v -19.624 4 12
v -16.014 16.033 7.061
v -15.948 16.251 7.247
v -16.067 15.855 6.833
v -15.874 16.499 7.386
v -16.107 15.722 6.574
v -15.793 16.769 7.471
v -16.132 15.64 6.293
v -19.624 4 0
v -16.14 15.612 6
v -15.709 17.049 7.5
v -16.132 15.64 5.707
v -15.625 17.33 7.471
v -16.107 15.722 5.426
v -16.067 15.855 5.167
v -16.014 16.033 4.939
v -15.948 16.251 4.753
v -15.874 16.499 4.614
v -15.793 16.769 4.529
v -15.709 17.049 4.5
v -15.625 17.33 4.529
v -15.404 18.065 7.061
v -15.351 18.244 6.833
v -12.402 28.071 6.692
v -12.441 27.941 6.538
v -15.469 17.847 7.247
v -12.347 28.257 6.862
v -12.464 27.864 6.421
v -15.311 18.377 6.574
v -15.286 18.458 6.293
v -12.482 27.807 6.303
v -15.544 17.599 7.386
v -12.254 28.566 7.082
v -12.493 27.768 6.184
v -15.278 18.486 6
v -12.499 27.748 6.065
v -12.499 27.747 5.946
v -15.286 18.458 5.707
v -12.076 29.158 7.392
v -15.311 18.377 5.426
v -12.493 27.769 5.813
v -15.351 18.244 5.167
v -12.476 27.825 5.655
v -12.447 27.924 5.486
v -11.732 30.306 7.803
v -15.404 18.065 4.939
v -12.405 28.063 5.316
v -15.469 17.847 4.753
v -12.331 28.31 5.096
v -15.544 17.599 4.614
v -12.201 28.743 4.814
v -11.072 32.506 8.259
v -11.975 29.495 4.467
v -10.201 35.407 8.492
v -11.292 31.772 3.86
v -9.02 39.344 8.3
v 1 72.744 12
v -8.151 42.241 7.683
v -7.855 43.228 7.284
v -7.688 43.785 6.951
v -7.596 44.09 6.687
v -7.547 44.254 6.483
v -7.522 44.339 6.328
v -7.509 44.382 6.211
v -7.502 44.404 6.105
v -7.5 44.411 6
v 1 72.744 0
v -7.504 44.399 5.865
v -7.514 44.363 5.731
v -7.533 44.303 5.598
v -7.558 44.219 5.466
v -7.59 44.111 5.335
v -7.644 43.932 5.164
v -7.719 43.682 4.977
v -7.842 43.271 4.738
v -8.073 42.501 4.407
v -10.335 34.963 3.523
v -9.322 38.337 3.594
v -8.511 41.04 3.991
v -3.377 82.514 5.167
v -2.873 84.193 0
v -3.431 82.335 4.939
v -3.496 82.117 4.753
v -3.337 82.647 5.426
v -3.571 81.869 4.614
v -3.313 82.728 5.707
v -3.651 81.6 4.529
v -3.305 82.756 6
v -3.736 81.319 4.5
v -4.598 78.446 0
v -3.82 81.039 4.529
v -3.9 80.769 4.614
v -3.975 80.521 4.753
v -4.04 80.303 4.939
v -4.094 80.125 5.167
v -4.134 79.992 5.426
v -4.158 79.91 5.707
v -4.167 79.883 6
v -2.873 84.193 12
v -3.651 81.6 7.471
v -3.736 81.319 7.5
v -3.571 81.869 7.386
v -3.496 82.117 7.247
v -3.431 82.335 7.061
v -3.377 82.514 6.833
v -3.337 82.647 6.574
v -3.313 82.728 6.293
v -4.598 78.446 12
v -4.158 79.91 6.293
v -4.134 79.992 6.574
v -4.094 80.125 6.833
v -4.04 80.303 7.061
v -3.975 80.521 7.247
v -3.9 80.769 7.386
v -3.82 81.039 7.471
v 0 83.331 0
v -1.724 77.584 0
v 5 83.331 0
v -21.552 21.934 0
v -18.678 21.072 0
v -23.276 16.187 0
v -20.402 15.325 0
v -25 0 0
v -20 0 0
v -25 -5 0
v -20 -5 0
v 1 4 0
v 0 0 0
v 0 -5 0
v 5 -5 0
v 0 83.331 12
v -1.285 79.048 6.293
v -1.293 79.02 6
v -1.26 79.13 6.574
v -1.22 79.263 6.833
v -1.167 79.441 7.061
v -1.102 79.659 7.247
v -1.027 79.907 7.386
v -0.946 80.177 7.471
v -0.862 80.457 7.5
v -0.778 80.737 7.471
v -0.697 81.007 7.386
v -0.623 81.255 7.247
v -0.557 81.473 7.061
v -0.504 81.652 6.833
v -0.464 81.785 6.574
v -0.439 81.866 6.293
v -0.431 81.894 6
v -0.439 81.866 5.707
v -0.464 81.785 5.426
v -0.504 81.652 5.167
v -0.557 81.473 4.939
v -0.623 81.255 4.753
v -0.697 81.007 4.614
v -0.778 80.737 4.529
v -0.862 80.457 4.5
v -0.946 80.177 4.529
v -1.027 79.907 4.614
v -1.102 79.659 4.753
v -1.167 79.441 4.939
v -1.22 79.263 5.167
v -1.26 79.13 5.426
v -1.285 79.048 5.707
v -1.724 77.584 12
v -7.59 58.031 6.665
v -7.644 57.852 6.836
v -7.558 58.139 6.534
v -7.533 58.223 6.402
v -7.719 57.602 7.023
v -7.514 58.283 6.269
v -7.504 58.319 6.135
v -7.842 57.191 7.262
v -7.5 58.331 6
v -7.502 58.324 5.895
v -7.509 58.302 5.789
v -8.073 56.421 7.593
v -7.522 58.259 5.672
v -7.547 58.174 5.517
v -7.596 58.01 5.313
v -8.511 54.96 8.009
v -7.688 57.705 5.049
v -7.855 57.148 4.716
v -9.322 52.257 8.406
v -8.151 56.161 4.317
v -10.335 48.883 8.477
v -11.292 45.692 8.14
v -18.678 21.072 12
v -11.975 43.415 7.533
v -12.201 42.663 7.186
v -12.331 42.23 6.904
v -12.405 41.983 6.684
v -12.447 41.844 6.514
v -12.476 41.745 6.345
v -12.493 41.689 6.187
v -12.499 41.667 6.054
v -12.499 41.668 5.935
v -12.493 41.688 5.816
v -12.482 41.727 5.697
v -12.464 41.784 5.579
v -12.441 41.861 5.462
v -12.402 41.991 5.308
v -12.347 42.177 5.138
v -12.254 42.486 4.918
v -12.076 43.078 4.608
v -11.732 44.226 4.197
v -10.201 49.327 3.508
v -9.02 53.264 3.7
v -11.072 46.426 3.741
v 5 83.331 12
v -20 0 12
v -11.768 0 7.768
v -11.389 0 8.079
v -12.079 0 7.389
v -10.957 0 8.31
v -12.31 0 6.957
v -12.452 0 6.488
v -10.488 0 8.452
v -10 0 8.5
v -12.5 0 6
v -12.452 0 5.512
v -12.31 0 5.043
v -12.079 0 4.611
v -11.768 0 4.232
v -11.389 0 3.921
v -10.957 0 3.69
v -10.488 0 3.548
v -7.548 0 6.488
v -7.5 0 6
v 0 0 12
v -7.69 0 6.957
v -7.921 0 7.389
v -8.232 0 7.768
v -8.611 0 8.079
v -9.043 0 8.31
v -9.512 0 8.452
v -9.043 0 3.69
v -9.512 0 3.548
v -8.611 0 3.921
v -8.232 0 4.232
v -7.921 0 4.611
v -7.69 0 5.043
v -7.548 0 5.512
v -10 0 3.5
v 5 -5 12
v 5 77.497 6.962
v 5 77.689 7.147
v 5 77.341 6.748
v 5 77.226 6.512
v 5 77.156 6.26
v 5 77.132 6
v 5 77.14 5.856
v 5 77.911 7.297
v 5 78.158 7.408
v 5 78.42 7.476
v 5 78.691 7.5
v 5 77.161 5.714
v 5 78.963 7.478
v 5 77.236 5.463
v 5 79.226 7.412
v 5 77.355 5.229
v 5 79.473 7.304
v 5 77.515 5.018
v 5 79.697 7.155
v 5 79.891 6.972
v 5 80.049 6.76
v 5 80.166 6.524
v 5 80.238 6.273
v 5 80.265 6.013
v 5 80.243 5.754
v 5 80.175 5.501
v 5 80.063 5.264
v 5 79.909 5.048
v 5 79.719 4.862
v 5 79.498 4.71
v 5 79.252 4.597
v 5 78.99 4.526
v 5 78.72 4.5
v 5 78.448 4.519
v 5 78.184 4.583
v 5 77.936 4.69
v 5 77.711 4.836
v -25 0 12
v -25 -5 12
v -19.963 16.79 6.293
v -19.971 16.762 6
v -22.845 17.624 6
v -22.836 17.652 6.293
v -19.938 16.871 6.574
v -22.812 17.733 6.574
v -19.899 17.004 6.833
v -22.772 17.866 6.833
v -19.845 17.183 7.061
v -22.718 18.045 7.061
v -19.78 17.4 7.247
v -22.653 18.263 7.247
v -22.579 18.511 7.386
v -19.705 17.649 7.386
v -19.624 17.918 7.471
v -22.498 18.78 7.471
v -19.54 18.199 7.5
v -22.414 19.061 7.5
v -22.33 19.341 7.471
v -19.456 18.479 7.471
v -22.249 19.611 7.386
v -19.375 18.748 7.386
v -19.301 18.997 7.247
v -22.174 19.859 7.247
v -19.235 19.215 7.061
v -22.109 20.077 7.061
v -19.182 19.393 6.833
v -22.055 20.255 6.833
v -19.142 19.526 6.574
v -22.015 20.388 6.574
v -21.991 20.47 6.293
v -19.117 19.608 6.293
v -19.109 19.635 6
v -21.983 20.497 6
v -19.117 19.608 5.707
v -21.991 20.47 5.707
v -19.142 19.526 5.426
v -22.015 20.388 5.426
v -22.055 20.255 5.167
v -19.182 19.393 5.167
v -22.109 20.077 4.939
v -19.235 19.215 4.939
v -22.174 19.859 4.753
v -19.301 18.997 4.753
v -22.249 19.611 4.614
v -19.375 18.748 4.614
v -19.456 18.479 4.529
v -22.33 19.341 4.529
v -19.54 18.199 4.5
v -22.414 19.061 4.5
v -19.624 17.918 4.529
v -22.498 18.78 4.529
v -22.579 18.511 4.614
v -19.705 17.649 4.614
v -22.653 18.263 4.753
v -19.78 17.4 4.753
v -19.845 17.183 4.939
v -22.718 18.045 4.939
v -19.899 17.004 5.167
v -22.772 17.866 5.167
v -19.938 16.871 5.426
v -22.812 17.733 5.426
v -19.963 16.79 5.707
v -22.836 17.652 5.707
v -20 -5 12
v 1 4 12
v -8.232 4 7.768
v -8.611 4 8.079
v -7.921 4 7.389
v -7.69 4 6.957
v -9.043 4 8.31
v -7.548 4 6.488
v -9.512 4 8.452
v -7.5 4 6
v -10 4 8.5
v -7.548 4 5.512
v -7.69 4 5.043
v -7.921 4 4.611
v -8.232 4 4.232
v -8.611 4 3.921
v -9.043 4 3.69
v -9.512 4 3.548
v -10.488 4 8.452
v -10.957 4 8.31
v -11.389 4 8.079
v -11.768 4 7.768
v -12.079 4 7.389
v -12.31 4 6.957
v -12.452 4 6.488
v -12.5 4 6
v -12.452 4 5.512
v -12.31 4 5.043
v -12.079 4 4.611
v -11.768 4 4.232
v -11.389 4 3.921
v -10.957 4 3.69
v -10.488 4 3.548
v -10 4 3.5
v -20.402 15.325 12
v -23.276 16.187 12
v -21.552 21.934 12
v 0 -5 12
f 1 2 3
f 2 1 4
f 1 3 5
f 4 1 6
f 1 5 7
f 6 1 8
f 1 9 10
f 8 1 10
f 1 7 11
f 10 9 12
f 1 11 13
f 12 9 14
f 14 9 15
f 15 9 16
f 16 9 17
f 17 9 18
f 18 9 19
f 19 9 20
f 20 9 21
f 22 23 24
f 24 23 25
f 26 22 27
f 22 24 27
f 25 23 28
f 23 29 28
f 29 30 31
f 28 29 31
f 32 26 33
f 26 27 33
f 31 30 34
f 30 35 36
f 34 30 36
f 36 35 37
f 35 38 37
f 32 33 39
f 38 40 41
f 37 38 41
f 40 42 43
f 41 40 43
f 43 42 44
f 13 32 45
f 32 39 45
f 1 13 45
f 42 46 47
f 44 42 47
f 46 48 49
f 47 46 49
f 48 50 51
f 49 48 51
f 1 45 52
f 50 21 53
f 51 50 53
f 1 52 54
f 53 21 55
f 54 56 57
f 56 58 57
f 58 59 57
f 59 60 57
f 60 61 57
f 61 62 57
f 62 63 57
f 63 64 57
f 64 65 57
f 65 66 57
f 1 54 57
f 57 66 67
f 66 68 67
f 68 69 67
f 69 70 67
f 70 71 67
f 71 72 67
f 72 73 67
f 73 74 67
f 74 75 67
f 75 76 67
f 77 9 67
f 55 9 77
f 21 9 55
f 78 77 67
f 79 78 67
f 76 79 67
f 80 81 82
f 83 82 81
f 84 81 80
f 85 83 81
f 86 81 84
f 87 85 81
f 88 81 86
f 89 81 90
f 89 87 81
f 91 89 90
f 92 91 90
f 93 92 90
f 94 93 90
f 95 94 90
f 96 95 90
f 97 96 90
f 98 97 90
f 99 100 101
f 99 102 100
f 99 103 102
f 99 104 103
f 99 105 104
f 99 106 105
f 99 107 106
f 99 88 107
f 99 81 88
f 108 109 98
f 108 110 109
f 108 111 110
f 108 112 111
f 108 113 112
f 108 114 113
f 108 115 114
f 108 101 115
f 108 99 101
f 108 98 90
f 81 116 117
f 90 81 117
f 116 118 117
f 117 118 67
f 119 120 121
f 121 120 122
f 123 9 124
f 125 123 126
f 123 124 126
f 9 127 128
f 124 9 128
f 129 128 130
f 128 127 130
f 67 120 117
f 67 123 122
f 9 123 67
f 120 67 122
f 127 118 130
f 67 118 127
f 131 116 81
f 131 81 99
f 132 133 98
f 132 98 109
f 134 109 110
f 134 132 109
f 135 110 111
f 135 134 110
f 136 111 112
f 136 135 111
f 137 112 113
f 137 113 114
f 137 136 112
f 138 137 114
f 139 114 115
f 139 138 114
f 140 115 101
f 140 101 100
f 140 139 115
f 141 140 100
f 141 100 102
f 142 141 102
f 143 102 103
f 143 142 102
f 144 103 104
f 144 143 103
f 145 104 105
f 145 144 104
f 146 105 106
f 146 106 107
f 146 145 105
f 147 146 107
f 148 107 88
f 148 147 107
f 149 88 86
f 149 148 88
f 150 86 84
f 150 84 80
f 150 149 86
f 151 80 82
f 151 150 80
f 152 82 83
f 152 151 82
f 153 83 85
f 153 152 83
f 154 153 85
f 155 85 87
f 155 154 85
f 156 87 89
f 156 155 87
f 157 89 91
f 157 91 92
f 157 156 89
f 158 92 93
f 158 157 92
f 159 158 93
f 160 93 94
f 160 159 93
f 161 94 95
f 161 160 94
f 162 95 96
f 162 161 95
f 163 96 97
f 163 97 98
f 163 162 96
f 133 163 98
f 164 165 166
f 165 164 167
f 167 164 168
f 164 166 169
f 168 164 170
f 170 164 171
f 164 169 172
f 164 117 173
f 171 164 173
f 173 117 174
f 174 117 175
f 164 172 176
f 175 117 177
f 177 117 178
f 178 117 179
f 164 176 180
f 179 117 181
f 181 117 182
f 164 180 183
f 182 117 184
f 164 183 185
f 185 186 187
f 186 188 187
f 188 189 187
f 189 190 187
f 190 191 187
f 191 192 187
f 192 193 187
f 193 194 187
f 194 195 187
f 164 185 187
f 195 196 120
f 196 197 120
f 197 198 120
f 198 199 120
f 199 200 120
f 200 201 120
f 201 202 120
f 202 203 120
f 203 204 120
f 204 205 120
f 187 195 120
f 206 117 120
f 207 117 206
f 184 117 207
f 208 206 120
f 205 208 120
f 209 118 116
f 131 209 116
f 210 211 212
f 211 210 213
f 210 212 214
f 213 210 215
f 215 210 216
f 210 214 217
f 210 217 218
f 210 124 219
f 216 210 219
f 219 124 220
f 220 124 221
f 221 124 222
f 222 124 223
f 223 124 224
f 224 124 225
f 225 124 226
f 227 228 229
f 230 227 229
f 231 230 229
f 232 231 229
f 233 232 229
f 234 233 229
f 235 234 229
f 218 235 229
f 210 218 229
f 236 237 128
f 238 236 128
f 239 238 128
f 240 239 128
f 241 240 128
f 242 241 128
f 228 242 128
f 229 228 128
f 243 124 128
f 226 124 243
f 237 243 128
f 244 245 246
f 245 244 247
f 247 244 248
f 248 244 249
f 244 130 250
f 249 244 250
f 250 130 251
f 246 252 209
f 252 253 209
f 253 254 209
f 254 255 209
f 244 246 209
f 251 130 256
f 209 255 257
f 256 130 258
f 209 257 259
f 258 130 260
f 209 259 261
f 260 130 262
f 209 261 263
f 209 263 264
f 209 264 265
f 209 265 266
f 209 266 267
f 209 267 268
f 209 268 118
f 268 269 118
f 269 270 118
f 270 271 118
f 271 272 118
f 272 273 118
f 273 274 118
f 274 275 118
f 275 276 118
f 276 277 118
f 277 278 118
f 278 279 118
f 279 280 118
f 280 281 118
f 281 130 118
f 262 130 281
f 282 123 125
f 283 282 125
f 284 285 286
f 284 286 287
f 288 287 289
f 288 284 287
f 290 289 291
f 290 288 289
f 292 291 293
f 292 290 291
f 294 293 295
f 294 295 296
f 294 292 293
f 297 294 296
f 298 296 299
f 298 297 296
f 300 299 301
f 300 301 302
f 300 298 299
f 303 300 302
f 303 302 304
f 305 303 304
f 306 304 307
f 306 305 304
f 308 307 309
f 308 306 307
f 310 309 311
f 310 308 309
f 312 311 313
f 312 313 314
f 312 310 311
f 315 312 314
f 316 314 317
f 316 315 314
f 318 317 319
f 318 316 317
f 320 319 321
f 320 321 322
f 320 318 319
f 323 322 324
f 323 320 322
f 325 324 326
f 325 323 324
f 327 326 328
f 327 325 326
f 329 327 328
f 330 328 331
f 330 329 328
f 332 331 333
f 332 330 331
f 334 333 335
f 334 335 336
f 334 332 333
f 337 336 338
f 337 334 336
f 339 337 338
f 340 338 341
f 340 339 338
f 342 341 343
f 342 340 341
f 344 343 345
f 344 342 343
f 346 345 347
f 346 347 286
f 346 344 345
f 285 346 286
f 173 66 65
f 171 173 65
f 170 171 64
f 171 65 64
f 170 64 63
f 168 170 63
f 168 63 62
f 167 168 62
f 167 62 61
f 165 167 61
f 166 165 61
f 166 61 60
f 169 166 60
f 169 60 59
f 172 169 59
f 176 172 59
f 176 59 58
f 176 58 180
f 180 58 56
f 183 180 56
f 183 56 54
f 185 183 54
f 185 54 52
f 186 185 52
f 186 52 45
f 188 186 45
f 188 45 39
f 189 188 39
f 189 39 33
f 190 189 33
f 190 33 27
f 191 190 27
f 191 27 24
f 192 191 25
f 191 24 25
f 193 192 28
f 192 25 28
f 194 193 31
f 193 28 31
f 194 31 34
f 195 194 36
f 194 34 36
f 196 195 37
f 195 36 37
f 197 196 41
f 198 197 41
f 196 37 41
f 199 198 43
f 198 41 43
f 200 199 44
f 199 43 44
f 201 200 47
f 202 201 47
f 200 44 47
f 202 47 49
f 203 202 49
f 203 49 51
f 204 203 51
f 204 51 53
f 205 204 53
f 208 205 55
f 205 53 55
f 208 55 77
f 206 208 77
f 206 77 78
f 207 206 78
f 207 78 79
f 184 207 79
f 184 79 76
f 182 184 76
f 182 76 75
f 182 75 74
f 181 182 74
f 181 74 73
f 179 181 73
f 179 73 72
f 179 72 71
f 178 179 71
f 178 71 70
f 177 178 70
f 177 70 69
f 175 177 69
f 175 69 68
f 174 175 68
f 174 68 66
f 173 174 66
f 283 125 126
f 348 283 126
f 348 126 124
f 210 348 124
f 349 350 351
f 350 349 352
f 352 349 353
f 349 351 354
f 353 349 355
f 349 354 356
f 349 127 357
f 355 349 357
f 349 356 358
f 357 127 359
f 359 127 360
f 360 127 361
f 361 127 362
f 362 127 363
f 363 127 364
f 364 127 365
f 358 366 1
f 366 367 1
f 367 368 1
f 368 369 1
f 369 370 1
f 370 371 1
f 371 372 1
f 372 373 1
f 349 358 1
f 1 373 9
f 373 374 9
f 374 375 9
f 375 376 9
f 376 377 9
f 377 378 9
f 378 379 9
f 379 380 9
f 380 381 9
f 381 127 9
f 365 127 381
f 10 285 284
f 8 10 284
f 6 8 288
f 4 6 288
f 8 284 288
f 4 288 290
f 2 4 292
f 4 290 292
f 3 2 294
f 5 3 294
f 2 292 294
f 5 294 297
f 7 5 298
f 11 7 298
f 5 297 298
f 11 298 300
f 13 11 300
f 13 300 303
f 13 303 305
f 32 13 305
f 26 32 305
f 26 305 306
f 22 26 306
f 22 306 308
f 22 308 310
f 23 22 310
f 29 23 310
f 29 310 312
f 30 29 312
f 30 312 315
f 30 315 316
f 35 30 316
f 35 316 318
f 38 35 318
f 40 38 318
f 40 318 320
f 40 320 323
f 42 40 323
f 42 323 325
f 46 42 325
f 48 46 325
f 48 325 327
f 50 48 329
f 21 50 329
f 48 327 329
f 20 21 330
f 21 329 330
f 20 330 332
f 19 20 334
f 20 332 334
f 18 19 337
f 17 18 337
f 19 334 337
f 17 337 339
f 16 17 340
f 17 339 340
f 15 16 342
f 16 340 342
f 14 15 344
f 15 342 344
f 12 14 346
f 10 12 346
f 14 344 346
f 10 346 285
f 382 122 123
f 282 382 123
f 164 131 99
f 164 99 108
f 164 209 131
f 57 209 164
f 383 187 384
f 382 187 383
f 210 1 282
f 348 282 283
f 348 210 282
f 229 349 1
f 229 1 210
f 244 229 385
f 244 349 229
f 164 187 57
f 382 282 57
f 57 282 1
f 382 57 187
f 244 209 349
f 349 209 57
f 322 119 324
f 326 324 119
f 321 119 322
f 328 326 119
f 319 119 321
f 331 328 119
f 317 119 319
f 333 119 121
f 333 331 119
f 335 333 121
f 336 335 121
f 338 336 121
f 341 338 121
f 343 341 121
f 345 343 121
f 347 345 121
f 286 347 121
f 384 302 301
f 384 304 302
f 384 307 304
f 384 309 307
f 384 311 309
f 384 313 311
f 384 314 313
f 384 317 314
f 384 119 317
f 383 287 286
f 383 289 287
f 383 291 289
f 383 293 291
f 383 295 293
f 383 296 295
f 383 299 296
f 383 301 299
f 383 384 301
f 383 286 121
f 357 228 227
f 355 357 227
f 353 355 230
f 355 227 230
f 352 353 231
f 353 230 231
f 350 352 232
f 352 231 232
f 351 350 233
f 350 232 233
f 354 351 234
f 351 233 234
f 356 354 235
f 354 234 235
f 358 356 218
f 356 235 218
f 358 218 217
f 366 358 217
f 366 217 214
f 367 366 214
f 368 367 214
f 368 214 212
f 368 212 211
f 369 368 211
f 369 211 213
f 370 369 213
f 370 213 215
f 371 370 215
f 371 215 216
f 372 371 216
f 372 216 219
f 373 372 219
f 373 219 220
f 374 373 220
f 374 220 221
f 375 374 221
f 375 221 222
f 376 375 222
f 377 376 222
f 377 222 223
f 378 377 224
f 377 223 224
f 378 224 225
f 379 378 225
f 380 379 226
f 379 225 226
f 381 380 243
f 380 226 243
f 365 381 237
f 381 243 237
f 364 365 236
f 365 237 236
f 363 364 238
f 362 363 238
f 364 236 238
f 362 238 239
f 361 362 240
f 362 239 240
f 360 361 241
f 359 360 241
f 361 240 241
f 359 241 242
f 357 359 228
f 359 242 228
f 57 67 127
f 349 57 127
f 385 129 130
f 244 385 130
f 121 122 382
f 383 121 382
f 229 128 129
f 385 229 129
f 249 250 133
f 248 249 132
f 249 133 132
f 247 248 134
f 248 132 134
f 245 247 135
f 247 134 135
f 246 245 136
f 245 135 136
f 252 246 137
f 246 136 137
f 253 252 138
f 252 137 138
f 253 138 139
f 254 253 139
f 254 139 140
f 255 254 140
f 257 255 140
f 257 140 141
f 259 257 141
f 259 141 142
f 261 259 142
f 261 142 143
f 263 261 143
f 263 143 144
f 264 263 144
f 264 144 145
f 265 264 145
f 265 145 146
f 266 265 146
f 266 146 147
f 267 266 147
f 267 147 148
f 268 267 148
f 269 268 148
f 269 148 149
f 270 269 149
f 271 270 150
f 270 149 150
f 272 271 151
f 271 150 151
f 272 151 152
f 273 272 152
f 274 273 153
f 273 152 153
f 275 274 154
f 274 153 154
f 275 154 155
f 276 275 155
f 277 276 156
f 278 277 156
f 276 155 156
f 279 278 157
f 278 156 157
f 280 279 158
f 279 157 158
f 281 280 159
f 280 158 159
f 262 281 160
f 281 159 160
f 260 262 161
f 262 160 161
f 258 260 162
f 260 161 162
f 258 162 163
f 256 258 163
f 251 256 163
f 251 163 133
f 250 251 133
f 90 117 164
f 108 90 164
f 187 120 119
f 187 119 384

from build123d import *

# Parameters (mm, degrees)
F1_DEPTH = 12
F2_R     = 2.5
F3_DEPTH = 83.331666624
F4_W     = 6
F4_H     = 12
F4_R     = 1.5
F5_DEPTH = 3
F6_DEPTH = 6.5712102501


with BuildPart() as f1:
    # F0 (on Top) → F1 (new body)
    with BuildSketch(Plane.XY):
        Polygon((-20, -5), (-20, 0), (0, 0), (0, -5), (5, -5), (5, 83.330666624), (0, 83.330666624), (-25, 0), (-25, -5), align=None)
        Polygon((1, 4), (-19.6238279597, 4), (1, 72.743893289), align=None, mode=Mode.SUBTRACT)
    extrude(amount=F1_DEPTH)

    # F2 (on face) → F3 (cut, through all)
    with BuildSketch(Plane.XZ):
        with Locations((-10, 6)):
            Circle(F2_R)
    extrude(amount=-F3_DEPTH, mode=Mode.SUBTRACT)

    # F4 (on face) → F5 (join)
    with BuildSketch(Plane(origin=(-22.9356586075, 6.8809177751, 0), x_dir=(-0.2873563218, -0.9578237543, 0), z_dir=(-0.9578237543, 0.2873563218, 0))):
        with Locations((-76.816091954, 6)):
            Rectangle(F4_W, F4_H)
        with Locations((-76.816091954, 6)):
            Circle(F4_R, mode=Mode.SUBTRACT)
        with Locations((-11.816091954, 6)):
            Rectangle(F4_W, F4_H)
        with Locations((-11.816091954, 6)):
            Circle(F4_R, mode=Mode.SUBTRACT)
    extrude(amount=F5_DEPTH)

    # F4 (on face) → F6 (cut, through all)
    with BuildSketch(Plane(origin=(-22.9356586075, 6.8809177751, 0), x_dir=(-0.2873563218, -0.9578237543, 0), z_dir=(-0.9578237543, 0.2873563218, 0))):
        with Locations((-76.816091954, 6)):
            Circle(F4_R)
        with Locations((-11.816091954, 6)):
            Circle(F4_R)
    extrude(amount=-F6_DEPTH, mode=Mode.SUBTRACT)


solid = f1.part
